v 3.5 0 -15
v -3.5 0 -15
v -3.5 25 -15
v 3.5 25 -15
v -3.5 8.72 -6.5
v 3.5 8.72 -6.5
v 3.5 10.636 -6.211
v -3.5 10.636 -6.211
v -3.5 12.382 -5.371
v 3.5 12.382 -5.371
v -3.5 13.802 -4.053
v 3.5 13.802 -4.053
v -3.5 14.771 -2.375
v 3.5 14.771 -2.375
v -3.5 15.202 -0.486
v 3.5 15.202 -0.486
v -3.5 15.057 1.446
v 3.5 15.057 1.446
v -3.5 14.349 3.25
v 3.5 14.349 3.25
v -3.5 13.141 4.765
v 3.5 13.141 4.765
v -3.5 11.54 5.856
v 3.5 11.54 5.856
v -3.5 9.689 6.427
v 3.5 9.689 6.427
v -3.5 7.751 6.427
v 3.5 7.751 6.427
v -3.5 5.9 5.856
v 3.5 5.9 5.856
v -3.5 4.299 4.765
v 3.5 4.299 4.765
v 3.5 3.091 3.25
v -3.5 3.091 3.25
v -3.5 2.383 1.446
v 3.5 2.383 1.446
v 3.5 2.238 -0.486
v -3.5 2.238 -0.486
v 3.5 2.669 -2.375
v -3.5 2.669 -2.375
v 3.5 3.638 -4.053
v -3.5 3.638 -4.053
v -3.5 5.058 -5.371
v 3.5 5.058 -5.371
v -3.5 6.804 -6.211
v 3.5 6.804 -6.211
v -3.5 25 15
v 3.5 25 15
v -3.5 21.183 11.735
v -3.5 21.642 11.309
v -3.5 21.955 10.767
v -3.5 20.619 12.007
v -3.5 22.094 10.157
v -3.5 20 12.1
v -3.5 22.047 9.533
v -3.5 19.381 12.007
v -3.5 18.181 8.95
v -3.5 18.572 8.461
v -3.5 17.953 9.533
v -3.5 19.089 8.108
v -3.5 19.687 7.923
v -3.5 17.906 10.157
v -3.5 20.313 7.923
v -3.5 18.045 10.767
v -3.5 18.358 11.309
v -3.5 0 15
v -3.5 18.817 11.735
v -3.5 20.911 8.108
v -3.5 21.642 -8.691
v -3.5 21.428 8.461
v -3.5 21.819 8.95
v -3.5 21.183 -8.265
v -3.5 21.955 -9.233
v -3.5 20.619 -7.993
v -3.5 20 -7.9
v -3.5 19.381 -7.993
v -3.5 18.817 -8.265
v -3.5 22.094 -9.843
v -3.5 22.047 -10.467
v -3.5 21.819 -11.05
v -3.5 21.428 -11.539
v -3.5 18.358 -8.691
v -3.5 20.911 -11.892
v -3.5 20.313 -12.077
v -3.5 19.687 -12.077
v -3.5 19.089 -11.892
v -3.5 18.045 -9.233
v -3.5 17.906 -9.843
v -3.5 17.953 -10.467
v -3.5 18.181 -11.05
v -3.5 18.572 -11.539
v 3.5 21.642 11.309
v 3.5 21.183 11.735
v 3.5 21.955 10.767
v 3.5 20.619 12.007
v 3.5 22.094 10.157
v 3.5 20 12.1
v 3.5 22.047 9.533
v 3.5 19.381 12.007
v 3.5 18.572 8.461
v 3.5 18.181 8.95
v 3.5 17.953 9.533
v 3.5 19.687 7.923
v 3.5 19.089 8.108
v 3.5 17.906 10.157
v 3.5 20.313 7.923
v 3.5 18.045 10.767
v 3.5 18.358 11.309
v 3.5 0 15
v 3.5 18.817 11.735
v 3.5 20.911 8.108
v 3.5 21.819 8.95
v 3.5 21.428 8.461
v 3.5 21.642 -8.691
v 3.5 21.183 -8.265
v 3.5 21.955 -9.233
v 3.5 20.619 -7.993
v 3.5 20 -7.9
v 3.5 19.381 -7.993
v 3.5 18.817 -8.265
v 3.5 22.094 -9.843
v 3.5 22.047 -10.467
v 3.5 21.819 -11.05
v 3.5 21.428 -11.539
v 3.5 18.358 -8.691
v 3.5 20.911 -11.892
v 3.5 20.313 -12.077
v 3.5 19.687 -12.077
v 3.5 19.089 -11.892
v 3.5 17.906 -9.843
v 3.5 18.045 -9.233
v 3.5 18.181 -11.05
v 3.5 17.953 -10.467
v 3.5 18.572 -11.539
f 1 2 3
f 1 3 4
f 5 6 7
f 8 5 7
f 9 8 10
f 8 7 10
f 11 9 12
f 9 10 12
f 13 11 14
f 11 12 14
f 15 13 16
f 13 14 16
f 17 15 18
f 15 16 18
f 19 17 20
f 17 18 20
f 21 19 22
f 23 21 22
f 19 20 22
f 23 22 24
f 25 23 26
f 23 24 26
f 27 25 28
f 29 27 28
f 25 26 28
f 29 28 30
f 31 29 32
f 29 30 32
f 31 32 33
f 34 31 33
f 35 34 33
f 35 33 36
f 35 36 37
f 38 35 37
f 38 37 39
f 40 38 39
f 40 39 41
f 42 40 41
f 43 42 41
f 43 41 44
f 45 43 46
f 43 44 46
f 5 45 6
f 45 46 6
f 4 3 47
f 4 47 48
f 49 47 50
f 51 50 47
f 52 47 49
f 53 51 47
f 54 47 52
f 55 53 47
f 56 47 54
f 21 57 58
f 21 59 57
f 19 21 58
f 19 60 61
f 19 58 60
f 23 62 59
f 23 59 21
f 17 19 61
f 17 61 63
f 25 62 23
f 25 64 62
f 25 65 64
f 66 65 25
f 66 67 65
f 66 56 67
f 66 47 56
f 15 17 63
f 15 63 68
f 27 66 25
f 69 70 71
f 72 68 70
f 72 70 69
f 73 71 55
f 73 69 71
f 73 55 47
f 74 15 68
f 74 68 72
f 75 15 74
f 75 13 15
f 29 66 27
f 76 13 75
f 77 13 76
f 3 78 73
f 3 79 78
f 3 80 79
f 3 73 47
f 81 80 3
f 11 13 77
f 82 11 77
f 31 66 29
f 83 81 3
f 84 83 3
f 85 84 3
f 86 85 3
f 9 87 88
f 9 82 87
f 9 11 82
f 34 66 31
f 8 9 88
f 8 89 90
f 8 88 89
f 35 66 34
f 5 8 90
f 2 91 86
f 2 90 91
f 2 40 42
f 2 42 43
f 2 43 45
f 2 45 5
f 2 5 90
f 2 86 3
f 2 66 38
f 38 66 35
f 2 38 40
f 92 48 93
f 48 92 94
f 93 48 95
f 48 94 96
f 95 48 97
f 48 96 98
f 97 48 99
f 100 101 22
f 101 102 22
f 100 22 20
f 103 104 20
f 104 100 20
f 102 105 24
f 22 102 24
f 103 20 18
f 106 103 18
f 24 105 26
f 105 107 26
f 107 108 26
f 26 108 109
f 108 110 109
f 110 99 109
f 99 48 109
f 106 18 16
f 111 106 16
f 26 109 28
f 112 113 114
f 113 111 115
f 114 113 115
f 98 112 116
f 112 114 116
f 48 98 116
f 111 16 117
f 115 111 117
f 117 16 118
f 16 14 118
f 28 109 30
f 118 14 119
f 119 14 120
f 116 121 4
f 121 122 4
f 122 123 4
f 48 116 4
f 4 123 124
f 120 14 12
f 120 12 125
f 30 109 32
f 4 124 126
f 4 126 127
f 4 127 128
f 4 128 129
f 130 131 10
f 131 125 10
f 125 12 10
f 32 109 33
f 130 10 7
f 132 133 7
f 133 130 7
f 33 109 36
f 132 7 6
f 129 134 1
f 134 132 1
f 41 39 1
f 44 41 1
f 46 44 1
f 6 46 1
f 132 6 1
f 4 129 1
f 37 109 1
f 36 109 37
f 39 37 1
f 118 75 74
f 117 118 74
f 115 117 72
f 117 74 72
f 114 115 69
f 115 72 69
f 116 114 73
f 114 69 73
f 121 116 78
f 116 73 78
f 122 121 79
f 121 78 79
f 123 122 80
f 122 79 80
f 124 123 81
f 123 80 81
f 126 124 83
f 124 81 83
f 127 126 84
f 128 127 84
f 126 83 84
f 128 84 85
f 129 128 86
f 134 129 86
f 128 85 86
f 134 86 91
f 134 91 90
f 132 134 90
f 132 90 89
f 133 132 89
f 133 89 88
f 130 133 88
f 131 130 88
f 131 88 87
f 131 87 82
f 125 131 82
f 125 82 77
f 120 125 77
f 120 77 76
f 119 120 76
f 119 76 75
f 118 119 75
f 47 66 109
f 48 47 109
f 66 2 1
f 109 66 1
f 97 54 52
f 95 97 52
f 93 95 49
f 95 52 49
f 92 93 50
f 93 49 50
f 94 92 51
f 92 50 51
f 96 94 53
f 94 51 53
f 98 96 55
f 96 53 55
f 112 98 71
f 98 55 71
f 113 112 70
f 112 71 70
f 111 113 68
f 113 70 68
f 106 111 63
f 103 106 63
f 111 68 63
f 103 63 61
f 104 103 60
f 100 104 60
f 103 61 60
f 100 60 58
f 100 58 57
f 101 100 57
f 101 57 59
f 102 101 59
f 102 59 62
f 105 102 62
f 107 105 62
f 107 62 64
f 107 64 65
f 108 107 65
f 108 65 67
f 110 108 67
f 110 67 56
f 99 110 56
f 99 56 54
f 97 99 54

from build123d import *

# Parameters (mm, degrees)
SKETCH2_W             = 7
SKETCH2_H             = 30
BOSS_EXTRUDE1_DEPTH   = 25
SKETCH5_R             = 6.5
CUT_EXTRUDE1_DEPTH    = 7
M5X0_8_TAPPED_HOLE2_D = 4.2


with BuildPart() as part:
    # Sketch2 → Boss-Extrude1 (new body)
    with BuildSketch(Plane(origin=(0, 0, 0), x_dir=(1, 0, 0), z_dir=(0, 1, 0))):
        Rectangle(SKETCH2_W, SKETCH2_H)
    extrude(amount=BOSS_EXTRUDE1_DEPTH)

    # Sketch5 → Cut-Extrude1 (cut)
    with BuildSketch(Plane(origin=(3.5, 0, 0), x_dir=(0, 0, -1), z_dir=(1, 0, 0))):
        with Locations((0, 8.72)):
            Circle(SKETCH5_R)
    extrude(amount=-CUT_EXTRUDE1_DEPTH, mode=Mode.SUBTRACT)

    # M5x0.8 Tapped Hole2 (through all)
    with Locations(Plane(origin=(3.5, 0, 0), x_dir=(0, 0, -1), z_dir=(1, 0, 0))):
        with Locations((10, 20), (-10, 20)):
            Hole(M5X0_8_TAPPED_HOLE2_D / 2)


solid = part.part
